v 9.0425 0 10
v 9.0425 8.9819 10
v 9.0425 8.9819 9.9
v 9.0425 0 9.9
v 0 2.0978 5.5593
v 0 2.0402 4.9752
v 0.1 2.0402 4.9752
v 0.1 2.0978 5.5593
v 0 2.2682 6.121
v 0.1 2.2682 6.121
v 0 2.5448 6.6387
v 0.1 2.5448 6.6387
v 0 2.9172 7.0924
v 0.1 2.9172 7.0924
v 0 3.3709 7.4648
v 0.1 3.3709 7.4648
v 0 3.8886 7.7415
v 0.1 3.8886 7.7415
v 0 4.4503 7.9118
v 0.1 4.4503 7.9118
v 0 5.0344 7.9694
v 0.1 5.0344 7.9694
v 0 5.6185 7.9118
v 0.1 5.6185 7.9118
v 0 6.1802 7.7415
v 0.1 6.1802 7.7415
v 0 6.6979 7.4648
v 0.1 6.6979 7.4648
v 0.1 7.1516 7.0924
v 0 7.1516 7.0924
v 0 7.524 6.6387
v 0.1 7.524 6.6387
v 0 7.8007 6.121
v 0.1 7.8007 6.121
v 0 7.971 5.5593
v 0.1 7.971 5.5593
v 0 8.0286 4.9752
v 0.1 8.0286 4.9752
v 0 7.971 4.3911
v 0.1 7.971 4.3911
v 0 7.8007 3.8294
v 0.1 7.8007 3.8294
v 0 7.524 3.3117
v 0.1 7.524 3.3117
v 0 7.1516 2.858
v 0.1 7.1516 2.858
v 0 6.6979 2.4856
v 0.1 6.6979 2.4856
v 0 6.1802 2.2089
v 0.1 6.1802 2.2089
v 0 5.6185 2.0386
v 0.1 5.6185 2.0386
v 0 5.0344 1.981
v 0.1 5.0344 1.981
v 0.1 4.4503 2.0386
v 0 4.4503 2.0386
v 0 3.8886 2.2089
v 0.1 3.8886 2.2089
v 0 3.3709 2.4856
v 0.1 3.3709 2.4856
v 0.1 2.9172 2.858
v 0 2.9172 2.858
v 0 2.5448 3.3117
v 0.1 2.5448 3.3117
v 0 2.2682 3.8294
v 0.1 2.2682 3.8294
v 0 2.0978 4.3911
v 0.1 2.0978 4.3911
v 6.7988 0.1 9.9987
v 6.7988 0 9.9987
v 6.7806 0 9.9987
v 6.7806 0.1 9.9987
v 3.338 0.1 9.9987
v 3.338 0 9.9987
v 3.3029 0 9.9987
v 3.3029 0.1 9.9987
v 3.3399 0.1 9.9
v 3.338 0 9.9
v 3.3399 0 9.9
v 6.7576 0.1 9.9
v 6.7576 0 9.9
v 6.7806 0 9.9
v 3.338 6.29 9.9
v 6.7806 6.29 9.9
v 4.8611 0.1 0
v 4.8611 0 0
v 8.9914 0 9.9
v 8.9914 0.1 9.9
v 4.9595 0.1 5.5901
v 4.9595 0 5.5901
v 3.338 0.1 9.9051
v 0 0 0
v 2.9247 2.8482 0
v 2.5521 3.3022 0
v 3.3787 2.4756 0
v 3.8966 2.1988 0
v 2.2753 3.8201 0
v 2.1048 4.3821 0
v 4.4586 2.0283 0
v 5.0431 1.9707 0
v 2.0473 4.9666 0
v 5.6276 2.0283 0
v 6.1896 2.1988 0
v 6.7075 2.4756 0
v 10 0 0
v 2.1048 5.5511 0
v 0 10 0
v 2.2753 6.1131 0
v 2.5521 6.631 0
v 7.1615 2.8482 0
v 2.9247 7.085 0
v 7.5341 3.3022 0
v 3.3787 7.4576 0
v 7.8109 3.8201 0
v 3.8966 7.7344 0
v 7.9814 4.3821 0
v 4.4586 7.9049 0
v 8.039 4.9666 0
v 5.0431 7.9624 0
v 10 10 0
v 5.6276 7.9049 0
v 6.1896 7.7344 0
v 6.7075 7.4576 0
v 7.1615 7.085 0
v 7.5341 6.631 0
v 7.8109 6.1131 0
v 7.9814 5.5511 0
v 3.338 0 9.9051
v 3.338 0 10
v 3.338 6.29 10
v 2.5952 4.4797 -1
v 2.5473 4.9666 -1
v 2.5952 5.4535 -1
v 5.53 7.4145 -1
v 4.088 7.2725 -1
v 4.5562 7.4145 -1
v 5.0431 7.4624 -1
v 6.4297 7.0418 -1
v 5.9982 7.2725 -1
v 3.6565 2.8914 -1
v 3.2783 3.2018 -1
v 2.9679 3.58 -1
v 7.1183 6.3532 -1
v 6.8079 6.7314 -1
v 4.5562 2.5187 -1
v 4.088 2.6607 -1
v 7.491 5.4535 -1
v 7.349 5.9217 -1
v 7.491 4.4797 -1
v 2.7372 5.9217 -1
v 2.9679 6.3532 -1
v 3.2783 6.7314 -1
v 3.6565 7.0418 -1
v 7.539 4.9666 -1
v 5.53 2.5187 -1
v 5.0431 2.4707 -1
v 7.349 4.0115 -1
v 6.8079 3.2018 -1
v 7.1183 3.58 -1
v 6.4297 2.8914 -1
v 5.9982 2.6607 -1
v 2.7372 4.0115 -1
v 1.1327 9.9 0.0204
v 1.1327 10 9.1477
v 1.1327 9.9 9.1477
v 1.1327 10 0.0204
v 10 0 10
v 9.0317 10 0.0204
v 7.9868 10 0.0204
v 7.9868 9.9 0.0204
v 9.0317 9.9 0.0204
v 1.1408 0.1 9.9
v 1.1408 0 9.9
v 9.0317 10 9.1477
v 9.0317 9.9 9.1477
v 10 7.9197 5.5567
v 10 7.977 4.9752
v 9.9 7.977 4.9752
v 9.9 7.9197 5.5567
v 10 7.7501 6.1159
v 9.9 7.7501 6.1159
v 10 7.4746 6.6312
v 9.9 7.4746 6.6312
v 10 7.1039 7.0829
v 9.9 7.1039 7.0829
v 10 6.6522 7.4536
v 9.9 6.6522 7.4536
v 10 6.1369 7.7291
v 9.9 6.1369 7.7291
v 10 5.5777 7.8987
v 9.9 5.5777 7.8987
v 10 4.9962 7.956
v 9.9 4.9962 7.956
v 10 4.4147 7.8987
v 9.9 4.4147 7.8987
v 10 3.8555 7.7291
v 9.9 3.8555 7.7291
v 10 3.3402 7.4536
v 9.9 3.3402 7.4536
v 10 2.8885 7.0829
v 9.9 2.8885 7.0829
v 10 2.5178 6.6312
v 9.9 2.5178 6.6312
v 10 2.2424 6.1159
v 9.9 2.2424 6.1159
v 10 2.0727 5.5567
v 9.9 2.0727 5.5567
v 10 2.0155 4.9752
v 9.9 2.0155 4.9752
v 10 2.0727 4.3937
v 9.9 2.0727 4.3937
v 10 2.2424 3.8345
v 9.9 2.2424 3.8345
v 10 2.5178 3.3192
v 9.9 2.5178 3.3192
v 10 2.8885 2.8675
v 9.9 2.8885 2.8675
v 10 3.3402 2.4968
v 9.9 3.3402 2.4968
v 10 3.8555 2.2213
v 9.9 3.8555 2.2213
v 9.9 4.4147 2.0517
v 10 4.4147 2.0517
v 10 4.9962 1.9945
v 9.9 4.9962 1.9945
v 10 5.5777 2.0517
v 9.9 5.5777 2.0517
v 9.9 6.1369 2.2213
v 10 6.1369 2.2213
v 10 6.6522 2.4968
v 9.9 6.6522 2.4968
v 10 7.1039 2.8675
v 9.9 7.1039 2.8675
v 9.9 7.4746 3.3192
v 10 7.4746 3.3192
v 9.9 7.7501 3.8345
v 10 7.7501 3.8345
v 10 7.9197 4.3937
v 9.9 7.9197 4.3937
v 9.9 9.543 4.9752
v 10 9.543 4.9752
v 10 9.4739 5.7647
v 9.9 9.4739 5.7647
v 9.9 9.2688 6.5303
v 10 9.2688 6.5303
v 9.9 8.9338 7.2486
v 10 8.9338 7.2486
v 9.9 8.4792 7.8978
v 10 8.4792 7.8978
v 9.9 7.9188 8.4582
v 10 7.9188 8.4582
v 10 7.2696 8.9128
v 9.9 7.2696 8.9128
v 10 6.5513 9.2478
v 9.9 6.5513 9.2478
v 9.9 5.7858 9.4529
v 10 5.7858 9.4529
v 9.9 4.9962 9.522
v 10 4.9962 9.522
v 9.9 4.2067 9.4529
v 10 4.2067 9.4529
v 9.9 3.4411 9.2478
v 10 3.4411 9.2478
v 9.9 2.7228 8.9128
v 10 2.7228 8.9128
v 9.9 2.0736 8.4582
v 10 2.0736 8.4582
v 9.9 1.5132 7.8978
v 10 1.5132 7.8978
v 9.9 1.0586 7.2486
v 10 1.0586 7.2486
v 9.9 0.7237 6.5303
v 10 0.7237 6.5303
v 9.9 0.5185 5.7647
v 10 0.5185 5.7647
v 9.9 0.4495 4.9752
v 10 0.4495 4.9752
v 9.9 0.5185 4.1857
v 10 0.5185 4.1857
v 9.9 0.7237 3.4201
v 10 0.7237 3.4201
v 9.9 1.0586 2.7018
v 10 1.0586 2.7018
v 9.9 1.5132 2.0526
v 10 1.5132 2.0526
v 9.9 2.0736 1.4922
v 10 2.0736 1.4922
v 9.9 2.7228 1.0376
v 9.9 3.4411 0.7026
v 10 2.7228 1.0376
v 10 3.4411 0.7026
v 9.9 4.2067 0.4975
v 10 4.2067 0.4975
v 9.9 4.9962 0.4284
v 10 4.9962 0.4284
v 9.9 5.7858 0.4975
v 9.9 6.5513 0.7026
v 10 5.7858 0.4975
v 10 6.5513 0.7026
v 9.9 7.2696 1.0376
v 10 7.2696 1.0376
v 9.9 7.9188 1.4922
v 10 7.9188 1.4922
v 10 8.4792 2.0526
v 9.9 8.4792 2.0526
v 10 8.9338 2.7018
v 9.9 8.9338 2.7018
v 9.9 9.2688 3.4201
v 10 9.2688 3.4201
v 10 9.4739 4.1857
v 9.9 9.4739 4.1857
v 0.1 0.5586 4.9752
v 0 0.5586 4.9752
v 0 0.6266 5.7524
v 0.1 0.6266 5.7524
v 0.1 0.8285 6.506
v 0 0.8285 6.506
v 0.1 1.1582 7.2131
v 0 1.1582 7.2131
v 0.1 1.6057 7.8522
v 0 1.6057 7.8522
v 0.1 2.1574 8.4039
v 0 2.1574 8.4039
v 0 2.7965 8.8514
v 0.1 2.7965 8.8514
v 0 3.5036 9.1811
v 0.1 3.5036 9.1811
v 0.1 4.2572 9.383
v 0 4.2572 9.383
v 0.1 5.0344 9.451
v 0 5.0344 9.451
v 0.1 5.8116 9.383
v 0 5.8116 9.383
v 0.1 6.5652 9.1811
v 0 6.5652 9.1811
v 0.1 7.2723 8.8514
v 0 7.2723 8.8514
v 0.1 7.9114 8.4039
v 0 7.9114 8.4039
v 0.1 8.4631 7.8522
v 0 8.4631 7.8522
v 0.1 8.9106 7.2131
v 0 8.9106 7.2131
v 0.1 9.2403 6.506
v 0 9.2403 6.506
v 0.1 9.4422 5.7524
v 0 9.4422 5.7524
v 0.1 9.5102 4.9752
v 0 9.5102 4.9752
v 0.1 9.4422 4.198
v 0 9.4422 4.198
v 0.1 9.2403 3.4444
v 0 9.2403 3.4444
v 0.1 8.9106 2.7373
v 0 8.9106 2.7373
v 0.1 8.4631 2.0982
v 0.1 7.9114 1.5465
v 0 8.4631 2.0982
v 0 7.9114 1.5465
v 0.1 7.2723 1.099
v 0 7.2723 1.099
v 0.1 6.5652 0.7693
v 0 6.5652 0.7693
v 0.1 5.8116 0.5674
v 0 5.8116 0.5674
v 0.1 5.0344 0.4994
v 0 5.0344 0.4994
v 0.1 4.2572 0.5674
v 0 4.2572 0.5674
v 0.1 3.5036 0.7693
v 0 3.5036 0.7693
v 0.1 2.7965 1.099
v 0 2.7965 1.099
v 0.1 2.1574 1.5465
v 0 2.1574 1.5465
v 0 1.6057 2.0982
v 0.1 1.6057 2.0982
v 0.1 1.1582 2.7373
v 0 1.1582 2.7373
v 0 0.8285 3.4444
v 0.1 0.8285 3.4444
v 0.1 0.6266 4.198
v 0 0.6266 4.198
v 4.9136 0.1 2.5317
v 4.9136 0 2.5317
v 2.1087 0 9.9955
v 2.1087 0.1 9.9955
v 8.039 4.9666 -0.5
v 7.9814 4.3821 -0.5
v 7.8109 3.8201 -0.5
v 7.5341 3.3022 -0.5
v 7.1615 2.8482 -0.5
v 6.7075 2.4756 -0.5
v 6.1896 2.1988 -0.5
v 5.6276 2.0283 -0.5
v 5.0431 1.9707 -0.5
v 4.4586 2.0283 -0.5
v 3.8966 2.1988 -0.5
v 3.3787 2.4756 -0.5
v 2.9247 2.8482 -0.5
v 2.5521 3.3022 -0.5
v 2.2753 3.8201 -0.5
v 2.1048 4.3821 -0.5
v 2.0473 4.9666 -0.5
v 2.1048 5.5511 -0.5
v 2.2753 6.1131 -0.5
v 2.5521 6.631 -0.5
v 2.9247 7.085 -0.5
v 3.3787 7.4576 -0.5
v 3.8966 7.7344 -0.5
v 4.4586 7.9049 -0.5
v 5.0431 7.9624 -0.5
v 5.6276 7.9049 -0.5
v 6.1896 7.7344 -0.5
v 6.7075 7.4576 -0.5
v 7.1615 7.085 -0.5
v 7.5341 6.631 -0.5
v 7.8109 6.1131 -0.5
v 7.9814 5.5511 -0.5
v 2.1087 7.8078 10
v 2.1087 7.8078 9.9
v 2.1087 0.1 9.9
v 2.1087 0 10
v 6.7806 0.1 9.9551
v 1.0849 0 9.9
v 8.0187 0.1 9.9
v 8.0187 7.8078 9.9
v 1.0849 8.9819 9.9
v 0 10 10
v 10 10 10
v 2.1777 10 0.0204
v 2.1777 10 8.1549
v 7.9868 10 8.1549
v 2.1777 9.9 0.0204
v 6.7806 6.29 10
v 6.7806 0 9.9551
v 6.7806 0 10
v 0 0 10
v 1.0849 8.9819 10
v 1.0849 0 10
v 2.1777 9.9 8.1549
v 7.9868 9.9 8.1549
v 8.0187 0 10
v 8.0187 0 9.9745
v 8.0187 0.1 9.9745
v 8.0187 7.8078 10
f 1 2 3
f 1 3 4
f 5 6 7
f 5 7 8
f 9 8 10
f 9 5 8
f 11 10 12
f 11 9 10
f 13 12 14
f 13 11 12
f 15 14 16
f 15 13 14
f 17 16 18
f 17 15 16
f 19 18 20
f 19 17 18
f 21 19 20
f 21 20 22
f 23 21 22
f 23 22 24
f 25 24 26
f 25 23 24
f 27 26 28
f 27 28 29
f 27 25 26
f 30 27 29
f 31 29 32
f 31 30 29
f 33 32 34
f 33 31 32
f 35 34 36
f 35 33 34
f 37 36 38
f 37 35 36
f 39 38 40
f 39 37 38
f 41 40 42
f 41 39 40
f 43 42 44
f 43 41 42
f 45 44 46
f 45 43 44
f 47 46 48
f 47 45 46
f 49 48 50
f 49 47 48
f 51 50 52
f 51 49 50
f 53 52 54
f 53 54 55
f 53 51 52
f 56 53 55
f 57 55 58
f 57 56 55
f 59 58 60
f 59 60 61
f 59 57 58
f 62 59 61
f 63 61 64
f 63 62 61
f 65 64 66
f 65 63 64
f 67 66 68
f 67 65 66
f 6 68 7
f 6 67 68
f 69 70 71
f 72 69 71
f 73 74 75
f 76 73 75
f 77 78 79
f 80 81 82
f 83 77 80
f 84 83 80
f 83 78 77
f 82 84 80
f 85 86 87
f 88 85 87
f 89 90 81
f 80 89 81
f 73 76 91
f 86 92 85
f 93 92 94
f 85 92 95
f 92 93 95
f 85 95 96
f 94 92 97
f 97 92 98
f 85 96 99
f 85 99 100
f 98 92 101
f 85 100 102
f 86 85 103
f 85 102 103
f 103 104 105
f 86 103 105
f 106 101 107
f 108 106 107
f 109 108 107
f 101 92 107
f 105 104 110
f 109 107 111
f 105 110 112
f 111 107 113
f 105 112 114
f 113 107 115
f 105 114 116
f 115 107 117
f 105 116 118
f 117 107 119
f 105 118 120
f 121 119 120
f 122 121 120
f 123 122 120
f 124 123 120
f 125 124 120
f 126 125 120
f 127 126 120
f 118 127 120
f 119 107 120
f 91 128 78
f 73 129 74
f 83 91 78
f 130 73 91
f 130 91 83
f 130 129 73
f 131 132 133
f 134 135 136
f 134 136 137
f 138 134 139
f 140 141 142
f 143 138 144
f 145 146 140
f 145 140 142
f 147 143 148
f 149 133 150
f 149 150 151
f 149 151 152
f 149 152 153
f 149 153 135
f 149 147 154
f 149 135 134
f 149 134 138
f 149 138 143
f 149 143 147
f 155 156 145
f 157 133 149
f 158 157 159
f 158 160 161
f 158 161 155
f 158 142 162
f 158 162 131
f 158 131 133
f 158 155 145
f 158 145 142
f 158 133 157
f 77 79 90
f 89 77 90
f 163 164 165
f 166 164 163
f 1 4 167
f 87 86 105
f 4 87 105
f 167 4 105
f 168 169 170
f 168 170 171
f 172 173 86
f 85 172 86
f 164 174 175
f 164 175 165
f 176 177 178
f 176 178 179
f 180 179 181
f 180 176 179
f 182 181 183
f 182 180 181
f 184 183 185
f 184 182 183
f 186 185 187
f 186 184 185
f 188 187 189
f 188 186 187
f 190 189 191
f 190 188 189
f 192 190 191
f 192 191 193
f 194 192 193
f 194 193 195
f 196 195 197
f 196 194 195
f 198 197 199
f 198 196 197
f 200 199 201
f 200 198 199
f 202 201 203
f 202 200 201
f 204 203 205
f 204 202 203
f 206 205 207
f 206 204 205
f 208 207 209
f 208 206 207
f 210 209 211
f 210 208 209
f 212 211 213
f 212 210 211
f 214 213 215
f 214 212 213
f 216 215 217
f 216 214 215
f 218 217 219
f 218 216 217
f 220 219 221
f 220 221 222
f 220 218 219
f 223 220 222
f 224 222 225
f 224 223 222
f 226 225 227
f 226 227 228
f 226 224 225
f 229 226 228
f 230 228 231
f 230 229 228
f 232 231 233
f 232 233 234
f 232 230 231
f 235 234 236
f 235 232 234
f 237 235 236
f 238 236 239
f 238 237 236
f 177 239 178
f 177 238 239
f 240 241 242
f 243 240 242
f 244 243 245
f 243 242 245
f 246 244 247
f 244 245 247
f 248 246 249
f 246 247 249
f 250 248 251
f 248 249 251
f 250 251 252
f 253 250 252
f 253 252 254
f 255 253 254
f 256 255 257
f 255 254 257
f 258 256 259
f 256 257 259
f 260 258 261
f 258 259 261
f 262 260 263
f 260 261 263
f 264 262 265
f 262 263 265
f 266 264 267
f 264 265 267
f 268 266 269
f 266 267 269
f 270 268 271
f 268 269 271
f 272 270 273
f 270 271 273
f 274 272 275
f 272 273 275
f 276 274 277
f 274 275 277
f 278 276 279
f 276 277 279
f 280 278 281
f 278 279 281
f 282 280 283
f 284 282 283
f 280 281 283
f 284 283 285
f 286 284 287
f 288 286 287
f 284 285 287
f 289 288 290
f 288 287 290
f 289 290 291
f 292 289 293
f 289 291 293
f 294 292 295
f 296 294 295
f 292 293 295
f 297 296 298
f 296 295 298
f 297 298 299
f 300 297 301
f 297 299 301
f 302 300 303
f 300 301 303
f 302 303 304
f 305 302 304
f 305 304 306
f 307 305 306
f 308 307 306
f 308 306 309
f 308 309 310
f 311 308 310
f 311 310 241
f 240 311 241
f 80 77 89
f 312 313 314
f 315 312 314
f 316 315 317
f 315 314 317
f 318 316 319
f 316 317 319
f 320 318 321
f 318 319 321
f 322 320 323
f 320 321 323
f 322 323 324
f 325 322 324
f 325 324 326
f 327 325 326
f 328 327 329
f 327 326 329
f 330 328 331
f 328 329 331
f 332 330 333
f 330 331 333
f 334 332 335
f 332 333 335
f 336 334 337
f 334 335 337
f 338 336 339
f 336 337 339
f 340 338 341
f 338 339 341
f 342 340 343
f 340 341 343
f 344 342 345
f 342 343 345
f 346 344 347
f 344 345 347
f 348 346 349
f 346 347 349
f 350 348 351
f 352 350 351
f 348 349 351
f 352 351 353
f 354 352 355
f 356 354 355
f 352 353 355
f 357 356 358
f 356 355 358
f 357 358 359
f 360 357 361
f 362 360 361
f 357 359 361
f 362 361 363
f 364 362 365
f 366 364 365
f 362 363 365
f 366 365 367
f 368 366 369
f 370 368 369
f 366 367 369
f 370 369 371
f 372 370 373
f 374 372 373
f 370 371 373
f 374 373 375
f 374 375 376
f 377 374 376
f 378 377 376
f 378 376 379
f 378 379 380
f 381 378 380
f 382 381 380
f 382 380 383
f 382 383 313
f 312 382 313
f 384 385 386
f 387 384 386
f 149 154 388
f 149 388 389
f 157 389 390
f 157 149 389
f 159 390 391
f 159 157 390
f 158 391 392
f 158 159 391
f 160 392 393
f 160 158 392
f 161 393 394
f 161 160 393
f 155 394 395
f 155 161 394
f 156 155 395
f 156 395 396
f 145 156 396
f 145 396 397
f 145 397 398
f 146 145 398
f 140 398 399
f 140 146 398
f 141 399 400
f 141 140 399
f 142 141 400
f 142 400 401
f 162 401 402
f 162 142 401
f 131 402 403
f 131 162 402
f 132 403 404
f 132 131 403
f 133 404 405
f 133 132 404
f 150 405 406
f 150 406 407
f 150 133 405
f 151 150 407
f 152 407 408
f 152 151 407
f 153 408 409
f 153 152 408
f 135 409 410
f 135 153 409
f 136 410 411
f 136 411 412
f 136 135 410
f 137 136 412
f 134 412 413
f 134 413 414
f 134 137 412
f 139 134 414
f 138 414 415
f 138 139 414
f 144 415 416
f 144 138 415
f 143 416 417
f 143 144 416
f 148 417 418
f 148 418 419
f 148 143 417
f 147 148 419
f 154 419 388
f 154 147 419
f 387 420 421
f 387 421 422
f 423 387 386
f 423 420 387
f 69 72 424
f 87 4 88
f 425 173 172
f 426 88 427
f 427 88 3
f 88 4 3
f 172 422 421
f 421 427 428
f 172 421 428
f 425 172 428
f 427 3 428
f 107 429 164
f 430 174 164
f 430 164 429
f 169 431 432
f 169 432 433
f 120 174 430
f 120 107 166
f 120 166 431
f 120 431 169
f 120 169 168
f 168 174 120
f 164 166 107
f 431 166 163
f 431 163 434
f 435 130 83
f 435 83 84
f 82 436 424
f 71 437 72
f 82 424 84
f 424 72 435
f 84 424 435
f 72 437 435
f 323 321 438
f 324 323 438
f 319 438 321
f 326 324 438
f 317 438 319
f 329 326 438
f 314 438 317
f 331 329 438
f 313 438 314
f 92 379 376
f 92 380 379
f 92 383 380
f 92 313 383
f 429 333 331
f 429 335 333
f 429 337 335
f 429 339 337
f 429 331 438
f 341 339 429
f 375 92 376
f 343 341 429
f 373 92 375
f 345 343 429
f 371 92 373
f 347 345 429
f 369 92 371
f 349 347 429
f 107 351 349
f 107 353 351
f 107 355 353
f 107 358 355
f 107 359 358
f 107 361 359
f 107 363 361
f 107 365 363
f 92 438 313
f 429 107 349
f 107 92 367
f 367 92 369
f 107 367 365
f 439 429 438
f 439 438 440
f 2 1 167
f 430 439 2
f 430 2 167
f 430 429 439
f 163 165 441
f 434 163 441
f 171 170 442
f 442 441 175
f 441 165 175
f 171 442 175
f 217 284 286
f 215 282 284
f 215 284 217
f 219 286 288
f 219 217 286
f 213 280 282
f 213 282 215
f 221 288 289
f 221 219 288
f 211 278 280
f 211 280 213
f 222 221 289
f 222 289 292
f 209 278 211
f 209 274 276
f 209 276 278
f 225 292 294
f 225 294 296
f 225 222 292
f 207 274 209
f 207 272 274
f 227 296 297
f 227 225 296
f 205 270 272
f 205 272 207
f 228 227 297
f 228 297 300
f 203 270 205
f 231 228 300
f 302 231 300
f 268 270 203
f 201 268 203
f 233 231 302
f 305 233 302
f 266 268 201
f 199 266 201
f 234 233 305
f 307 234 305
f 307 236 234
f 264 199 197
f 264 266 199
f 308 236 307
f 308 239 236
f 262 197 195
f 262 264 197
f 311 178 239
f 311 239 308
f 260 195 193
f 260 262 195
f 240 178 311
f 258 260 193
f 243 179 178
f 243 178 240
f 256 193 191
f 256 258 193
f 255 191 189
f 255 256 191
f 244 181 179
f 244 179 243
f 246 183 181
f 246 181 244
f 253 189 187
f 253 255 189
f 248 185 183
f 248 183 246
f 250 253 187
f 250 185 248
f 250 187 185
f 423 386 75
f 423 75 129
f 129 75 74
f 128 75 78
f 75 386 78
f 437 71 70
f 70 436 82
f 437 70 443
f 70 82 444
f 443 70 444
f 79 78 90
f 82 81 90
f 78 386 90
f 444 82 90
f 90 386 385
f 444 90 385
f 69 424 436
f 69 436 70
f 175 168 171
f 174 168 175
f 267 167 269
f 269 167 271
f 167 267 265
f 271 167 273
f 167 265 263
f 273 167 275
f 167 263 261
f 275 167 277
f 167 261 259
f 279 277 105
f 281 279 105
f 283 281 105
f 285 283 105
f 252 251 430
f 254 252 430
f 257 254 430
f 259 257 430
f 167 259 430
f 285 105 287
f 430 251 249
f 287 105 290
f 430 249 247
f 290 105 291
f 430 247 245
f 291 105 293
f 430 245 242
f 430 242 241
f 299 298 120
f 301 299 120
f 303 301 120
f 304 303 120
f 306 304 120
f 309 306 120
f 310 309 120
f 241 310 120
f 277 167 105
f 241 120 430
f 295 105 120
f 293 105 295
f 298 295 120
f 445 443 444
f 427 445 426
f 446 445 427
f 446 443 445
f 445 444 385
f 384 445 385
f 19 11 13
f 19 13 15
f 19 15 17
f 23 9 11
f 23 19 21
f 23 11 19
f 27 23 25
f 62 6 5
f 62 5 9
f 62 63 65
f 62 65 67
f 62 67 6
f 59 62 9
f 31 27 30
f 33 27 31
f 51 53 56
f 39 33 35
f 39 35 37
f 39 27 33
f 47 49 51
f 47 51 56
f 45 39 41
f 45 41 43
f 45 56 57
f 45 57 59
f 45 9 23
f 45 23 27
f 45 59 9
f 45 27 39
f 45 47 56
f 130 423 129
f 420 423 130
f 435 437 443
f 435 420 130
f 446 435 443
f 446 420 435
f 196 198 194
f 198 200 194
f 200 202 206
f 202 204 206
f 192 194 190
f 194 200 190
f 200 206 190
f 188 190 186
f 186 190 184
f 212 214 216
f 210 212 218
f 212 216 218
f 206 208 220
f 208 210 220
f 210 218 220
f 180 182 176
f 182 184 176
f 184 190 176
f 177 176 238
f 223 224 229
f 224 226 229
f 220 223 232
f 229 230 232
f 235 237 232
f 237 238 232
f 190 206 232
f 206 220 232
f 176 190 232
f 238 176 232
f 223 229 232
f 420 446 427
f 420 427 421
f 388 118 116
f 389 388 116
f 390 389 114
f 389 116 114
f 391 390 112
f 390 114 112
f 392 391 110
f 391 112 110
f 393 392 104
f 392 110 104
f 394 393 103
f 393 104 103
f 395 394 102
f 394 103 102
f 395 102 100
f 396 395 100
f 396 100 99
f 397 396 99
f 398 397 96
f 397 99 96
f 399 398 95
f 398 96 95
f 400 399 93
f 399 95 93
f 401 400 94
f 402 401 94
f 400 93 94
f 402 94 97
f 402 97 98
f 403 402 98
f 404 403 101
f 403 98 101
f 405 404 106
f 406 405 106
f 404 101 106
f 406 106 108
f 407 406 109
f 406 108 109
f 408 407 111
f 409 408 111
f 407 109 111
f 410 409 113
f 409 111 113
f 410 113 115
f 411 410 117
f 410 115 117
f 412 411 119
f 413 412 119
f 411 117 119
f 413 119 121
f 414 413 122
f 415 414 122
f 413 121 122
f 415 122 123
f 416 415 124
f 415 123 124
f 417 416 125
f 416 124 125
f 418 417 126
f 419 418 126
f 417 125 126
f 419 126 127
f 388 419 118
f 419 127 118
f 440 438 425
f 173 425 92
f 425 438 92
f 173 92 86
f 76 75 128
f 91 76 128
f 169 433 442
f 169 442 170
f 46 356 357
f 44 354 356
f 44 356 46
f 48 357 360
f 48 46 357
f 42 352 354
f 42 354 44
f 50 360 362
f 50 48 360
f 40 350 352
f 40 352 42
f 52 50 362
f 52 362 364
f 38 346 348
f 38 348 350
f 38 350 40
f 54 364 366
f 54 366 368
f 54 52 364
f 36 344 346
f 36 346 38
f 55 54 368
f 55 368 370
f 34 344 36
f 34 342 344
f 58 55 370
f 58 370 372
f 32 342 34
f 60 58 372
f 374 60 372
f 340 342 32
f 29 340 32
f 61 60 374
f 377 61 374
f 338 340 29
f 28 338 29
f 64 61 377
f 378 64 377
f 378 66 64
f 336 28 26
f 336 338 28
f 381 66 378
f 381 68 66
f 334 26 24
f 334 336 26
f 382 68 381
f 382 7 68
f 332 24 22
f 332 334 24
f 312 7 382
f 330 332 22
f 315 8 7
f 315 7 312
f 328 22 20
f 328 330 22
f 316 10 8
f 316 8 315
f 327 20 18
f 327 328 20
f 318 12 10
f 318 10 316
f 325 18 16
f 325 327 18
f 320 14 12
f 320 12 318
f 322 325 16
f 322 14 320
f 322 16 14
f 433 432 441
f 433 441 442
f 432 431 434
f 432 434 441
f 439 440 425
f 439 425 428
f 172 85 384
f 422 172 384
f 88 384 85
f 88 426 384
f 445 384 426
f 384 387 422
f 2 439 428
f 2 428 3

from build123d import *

# Parameters (mm, degrees)
BOX_W           = 10
BOX_H           = 10
BOX_DEPTH       = 10
SKETCH005_R     = 2.995854
PAD_DEPTH       = 1
CHAMFER_SIZE    = 0.5
POCKET_DEPTH    = 0.1
SKETCH002_R     = 4.475809
SKETCH002_R_2   = 2.994172
POCKET001_DEPTH = 0.1
SKETCH003_R     = 4.54676
SKETCH003_R_2   = 2.980749
POCKET002_DEPTH = 0.1
SKETCH001_W     = 3.442568
SKETCH001_H     = 6.289959
POCKET003_DEPTH = 0.1
POCKET004_DEPTH = 0.1


with BuildPart() as part:
    # Box → Box (new body)
    with BuildSketch(Plane.XY):
        with Locations((5, 5)):
            Rectangle(BOX_W, BOX_H)
    extrude(amount=BOX_DEPTH)

    # Sketch005 → Pad (new body)
    with BuildSketch(Plane(origin=(0, 0, 0), x_dir=(1, 0, 0), z_dir=(0, 0, -1))):
        with Locations((5.043108, -4.966595)):
            Circle(SKETCH005_R)
    extrude(amount=PAD_DEPTH)

    # Chamfer
    chamfer_edges = [part.edges().sort_by_distance(p)[0] for p in [
        (2.047254, 4.966595, -1),
    ]]
    chamfer(chamfer_edges, length=CHAMFER_SIZE)

    # Sketch → Pocket (cut)
    with BuildSketch(Plane.XZ):
        Polygon((1.103754, 9.998665), (4.861133, 0), (9.025593, 9.981961), (8.021794, 9.981961), (4.913553, 2.531693), (2.107553, 9.998665), align=None)
        Polygon((3.302861, 9.998682), (4.959537, 5.590146), (6.798772, 9.998682), align=None)
    extrude(amount=-POCKET_DEPTH, mode=Mode.SUBTRACT)

    # Sketch002 → Pocket001 (cut)
    with BuildSketch(Plane(origin=(0, 0, 0), x_dir=(0, -1, 0), z_dir=(-1, 0, 0))):
        with Locations((-5.03441, 4.975201)):
            Circle(SKETCH002_R)
        with Locations((-5.03441, 4.975201)):
            Circle(SKETCH002_R_2, mode=Mode.SUBTRACT)
    extrude(amount=-POCKET001_DEPTH, mode=Mode.SUBTRACT)

    # Sketch003 → Pocket002 (cut)
    with BuildSketch(Plane.YZ.offset(10)):
        with Locations((4.996224, 4.975201)):
            Circle(SKETCH003_R)
        with Locations((4.996224, 4.975201)):
            Circle(SKETCH003_R_2, mode=Mode.SUBTRACT)
    extrude(amount=-POCKET002_DEPTH, mode=Mode.SUBTRACT)

    # Sketch001 → Pocket003 (cut)
    with BuildSketch(Plane.XY.offset(10)):
        Polygon((1.084873, 0), (1.084873, 8.981867), (9.042541, 8.981867), (9.042541, 0), (8.018671, 0), (8.018671, 7.807773), (2.108743, 7.807773), (2.108743, 0), align=None)
        with Locations((5.059318, 3.144979)):
            Rectangle(SKETCH001_W, SKETCH001_H)
    extrude(amount=-POCKET003_DEPTH, mode=Mode.SUBTRACT)

    # Sketch004 → Pocket004 (cut)
    with BuildSketch(Plane(origin=(0, 10, 0), x_dir=(-1, 0, 0), z_dir=(0, 1, 0))):
        Polygon((-9.031718, 0.020387), (-9.031718, 9.147731), (-1.132726, 9.147731), (-1.132726, 0.020387), (-2.177661, 0.020387), (-2.177661, 8.15491), (-7.986783, 8.15491), (-7.986783, 0.020387), align=None)
    extrude(amount=-POCKET004_DEPTH, mode=Mode.SUBTRACT)


solid = part.part
